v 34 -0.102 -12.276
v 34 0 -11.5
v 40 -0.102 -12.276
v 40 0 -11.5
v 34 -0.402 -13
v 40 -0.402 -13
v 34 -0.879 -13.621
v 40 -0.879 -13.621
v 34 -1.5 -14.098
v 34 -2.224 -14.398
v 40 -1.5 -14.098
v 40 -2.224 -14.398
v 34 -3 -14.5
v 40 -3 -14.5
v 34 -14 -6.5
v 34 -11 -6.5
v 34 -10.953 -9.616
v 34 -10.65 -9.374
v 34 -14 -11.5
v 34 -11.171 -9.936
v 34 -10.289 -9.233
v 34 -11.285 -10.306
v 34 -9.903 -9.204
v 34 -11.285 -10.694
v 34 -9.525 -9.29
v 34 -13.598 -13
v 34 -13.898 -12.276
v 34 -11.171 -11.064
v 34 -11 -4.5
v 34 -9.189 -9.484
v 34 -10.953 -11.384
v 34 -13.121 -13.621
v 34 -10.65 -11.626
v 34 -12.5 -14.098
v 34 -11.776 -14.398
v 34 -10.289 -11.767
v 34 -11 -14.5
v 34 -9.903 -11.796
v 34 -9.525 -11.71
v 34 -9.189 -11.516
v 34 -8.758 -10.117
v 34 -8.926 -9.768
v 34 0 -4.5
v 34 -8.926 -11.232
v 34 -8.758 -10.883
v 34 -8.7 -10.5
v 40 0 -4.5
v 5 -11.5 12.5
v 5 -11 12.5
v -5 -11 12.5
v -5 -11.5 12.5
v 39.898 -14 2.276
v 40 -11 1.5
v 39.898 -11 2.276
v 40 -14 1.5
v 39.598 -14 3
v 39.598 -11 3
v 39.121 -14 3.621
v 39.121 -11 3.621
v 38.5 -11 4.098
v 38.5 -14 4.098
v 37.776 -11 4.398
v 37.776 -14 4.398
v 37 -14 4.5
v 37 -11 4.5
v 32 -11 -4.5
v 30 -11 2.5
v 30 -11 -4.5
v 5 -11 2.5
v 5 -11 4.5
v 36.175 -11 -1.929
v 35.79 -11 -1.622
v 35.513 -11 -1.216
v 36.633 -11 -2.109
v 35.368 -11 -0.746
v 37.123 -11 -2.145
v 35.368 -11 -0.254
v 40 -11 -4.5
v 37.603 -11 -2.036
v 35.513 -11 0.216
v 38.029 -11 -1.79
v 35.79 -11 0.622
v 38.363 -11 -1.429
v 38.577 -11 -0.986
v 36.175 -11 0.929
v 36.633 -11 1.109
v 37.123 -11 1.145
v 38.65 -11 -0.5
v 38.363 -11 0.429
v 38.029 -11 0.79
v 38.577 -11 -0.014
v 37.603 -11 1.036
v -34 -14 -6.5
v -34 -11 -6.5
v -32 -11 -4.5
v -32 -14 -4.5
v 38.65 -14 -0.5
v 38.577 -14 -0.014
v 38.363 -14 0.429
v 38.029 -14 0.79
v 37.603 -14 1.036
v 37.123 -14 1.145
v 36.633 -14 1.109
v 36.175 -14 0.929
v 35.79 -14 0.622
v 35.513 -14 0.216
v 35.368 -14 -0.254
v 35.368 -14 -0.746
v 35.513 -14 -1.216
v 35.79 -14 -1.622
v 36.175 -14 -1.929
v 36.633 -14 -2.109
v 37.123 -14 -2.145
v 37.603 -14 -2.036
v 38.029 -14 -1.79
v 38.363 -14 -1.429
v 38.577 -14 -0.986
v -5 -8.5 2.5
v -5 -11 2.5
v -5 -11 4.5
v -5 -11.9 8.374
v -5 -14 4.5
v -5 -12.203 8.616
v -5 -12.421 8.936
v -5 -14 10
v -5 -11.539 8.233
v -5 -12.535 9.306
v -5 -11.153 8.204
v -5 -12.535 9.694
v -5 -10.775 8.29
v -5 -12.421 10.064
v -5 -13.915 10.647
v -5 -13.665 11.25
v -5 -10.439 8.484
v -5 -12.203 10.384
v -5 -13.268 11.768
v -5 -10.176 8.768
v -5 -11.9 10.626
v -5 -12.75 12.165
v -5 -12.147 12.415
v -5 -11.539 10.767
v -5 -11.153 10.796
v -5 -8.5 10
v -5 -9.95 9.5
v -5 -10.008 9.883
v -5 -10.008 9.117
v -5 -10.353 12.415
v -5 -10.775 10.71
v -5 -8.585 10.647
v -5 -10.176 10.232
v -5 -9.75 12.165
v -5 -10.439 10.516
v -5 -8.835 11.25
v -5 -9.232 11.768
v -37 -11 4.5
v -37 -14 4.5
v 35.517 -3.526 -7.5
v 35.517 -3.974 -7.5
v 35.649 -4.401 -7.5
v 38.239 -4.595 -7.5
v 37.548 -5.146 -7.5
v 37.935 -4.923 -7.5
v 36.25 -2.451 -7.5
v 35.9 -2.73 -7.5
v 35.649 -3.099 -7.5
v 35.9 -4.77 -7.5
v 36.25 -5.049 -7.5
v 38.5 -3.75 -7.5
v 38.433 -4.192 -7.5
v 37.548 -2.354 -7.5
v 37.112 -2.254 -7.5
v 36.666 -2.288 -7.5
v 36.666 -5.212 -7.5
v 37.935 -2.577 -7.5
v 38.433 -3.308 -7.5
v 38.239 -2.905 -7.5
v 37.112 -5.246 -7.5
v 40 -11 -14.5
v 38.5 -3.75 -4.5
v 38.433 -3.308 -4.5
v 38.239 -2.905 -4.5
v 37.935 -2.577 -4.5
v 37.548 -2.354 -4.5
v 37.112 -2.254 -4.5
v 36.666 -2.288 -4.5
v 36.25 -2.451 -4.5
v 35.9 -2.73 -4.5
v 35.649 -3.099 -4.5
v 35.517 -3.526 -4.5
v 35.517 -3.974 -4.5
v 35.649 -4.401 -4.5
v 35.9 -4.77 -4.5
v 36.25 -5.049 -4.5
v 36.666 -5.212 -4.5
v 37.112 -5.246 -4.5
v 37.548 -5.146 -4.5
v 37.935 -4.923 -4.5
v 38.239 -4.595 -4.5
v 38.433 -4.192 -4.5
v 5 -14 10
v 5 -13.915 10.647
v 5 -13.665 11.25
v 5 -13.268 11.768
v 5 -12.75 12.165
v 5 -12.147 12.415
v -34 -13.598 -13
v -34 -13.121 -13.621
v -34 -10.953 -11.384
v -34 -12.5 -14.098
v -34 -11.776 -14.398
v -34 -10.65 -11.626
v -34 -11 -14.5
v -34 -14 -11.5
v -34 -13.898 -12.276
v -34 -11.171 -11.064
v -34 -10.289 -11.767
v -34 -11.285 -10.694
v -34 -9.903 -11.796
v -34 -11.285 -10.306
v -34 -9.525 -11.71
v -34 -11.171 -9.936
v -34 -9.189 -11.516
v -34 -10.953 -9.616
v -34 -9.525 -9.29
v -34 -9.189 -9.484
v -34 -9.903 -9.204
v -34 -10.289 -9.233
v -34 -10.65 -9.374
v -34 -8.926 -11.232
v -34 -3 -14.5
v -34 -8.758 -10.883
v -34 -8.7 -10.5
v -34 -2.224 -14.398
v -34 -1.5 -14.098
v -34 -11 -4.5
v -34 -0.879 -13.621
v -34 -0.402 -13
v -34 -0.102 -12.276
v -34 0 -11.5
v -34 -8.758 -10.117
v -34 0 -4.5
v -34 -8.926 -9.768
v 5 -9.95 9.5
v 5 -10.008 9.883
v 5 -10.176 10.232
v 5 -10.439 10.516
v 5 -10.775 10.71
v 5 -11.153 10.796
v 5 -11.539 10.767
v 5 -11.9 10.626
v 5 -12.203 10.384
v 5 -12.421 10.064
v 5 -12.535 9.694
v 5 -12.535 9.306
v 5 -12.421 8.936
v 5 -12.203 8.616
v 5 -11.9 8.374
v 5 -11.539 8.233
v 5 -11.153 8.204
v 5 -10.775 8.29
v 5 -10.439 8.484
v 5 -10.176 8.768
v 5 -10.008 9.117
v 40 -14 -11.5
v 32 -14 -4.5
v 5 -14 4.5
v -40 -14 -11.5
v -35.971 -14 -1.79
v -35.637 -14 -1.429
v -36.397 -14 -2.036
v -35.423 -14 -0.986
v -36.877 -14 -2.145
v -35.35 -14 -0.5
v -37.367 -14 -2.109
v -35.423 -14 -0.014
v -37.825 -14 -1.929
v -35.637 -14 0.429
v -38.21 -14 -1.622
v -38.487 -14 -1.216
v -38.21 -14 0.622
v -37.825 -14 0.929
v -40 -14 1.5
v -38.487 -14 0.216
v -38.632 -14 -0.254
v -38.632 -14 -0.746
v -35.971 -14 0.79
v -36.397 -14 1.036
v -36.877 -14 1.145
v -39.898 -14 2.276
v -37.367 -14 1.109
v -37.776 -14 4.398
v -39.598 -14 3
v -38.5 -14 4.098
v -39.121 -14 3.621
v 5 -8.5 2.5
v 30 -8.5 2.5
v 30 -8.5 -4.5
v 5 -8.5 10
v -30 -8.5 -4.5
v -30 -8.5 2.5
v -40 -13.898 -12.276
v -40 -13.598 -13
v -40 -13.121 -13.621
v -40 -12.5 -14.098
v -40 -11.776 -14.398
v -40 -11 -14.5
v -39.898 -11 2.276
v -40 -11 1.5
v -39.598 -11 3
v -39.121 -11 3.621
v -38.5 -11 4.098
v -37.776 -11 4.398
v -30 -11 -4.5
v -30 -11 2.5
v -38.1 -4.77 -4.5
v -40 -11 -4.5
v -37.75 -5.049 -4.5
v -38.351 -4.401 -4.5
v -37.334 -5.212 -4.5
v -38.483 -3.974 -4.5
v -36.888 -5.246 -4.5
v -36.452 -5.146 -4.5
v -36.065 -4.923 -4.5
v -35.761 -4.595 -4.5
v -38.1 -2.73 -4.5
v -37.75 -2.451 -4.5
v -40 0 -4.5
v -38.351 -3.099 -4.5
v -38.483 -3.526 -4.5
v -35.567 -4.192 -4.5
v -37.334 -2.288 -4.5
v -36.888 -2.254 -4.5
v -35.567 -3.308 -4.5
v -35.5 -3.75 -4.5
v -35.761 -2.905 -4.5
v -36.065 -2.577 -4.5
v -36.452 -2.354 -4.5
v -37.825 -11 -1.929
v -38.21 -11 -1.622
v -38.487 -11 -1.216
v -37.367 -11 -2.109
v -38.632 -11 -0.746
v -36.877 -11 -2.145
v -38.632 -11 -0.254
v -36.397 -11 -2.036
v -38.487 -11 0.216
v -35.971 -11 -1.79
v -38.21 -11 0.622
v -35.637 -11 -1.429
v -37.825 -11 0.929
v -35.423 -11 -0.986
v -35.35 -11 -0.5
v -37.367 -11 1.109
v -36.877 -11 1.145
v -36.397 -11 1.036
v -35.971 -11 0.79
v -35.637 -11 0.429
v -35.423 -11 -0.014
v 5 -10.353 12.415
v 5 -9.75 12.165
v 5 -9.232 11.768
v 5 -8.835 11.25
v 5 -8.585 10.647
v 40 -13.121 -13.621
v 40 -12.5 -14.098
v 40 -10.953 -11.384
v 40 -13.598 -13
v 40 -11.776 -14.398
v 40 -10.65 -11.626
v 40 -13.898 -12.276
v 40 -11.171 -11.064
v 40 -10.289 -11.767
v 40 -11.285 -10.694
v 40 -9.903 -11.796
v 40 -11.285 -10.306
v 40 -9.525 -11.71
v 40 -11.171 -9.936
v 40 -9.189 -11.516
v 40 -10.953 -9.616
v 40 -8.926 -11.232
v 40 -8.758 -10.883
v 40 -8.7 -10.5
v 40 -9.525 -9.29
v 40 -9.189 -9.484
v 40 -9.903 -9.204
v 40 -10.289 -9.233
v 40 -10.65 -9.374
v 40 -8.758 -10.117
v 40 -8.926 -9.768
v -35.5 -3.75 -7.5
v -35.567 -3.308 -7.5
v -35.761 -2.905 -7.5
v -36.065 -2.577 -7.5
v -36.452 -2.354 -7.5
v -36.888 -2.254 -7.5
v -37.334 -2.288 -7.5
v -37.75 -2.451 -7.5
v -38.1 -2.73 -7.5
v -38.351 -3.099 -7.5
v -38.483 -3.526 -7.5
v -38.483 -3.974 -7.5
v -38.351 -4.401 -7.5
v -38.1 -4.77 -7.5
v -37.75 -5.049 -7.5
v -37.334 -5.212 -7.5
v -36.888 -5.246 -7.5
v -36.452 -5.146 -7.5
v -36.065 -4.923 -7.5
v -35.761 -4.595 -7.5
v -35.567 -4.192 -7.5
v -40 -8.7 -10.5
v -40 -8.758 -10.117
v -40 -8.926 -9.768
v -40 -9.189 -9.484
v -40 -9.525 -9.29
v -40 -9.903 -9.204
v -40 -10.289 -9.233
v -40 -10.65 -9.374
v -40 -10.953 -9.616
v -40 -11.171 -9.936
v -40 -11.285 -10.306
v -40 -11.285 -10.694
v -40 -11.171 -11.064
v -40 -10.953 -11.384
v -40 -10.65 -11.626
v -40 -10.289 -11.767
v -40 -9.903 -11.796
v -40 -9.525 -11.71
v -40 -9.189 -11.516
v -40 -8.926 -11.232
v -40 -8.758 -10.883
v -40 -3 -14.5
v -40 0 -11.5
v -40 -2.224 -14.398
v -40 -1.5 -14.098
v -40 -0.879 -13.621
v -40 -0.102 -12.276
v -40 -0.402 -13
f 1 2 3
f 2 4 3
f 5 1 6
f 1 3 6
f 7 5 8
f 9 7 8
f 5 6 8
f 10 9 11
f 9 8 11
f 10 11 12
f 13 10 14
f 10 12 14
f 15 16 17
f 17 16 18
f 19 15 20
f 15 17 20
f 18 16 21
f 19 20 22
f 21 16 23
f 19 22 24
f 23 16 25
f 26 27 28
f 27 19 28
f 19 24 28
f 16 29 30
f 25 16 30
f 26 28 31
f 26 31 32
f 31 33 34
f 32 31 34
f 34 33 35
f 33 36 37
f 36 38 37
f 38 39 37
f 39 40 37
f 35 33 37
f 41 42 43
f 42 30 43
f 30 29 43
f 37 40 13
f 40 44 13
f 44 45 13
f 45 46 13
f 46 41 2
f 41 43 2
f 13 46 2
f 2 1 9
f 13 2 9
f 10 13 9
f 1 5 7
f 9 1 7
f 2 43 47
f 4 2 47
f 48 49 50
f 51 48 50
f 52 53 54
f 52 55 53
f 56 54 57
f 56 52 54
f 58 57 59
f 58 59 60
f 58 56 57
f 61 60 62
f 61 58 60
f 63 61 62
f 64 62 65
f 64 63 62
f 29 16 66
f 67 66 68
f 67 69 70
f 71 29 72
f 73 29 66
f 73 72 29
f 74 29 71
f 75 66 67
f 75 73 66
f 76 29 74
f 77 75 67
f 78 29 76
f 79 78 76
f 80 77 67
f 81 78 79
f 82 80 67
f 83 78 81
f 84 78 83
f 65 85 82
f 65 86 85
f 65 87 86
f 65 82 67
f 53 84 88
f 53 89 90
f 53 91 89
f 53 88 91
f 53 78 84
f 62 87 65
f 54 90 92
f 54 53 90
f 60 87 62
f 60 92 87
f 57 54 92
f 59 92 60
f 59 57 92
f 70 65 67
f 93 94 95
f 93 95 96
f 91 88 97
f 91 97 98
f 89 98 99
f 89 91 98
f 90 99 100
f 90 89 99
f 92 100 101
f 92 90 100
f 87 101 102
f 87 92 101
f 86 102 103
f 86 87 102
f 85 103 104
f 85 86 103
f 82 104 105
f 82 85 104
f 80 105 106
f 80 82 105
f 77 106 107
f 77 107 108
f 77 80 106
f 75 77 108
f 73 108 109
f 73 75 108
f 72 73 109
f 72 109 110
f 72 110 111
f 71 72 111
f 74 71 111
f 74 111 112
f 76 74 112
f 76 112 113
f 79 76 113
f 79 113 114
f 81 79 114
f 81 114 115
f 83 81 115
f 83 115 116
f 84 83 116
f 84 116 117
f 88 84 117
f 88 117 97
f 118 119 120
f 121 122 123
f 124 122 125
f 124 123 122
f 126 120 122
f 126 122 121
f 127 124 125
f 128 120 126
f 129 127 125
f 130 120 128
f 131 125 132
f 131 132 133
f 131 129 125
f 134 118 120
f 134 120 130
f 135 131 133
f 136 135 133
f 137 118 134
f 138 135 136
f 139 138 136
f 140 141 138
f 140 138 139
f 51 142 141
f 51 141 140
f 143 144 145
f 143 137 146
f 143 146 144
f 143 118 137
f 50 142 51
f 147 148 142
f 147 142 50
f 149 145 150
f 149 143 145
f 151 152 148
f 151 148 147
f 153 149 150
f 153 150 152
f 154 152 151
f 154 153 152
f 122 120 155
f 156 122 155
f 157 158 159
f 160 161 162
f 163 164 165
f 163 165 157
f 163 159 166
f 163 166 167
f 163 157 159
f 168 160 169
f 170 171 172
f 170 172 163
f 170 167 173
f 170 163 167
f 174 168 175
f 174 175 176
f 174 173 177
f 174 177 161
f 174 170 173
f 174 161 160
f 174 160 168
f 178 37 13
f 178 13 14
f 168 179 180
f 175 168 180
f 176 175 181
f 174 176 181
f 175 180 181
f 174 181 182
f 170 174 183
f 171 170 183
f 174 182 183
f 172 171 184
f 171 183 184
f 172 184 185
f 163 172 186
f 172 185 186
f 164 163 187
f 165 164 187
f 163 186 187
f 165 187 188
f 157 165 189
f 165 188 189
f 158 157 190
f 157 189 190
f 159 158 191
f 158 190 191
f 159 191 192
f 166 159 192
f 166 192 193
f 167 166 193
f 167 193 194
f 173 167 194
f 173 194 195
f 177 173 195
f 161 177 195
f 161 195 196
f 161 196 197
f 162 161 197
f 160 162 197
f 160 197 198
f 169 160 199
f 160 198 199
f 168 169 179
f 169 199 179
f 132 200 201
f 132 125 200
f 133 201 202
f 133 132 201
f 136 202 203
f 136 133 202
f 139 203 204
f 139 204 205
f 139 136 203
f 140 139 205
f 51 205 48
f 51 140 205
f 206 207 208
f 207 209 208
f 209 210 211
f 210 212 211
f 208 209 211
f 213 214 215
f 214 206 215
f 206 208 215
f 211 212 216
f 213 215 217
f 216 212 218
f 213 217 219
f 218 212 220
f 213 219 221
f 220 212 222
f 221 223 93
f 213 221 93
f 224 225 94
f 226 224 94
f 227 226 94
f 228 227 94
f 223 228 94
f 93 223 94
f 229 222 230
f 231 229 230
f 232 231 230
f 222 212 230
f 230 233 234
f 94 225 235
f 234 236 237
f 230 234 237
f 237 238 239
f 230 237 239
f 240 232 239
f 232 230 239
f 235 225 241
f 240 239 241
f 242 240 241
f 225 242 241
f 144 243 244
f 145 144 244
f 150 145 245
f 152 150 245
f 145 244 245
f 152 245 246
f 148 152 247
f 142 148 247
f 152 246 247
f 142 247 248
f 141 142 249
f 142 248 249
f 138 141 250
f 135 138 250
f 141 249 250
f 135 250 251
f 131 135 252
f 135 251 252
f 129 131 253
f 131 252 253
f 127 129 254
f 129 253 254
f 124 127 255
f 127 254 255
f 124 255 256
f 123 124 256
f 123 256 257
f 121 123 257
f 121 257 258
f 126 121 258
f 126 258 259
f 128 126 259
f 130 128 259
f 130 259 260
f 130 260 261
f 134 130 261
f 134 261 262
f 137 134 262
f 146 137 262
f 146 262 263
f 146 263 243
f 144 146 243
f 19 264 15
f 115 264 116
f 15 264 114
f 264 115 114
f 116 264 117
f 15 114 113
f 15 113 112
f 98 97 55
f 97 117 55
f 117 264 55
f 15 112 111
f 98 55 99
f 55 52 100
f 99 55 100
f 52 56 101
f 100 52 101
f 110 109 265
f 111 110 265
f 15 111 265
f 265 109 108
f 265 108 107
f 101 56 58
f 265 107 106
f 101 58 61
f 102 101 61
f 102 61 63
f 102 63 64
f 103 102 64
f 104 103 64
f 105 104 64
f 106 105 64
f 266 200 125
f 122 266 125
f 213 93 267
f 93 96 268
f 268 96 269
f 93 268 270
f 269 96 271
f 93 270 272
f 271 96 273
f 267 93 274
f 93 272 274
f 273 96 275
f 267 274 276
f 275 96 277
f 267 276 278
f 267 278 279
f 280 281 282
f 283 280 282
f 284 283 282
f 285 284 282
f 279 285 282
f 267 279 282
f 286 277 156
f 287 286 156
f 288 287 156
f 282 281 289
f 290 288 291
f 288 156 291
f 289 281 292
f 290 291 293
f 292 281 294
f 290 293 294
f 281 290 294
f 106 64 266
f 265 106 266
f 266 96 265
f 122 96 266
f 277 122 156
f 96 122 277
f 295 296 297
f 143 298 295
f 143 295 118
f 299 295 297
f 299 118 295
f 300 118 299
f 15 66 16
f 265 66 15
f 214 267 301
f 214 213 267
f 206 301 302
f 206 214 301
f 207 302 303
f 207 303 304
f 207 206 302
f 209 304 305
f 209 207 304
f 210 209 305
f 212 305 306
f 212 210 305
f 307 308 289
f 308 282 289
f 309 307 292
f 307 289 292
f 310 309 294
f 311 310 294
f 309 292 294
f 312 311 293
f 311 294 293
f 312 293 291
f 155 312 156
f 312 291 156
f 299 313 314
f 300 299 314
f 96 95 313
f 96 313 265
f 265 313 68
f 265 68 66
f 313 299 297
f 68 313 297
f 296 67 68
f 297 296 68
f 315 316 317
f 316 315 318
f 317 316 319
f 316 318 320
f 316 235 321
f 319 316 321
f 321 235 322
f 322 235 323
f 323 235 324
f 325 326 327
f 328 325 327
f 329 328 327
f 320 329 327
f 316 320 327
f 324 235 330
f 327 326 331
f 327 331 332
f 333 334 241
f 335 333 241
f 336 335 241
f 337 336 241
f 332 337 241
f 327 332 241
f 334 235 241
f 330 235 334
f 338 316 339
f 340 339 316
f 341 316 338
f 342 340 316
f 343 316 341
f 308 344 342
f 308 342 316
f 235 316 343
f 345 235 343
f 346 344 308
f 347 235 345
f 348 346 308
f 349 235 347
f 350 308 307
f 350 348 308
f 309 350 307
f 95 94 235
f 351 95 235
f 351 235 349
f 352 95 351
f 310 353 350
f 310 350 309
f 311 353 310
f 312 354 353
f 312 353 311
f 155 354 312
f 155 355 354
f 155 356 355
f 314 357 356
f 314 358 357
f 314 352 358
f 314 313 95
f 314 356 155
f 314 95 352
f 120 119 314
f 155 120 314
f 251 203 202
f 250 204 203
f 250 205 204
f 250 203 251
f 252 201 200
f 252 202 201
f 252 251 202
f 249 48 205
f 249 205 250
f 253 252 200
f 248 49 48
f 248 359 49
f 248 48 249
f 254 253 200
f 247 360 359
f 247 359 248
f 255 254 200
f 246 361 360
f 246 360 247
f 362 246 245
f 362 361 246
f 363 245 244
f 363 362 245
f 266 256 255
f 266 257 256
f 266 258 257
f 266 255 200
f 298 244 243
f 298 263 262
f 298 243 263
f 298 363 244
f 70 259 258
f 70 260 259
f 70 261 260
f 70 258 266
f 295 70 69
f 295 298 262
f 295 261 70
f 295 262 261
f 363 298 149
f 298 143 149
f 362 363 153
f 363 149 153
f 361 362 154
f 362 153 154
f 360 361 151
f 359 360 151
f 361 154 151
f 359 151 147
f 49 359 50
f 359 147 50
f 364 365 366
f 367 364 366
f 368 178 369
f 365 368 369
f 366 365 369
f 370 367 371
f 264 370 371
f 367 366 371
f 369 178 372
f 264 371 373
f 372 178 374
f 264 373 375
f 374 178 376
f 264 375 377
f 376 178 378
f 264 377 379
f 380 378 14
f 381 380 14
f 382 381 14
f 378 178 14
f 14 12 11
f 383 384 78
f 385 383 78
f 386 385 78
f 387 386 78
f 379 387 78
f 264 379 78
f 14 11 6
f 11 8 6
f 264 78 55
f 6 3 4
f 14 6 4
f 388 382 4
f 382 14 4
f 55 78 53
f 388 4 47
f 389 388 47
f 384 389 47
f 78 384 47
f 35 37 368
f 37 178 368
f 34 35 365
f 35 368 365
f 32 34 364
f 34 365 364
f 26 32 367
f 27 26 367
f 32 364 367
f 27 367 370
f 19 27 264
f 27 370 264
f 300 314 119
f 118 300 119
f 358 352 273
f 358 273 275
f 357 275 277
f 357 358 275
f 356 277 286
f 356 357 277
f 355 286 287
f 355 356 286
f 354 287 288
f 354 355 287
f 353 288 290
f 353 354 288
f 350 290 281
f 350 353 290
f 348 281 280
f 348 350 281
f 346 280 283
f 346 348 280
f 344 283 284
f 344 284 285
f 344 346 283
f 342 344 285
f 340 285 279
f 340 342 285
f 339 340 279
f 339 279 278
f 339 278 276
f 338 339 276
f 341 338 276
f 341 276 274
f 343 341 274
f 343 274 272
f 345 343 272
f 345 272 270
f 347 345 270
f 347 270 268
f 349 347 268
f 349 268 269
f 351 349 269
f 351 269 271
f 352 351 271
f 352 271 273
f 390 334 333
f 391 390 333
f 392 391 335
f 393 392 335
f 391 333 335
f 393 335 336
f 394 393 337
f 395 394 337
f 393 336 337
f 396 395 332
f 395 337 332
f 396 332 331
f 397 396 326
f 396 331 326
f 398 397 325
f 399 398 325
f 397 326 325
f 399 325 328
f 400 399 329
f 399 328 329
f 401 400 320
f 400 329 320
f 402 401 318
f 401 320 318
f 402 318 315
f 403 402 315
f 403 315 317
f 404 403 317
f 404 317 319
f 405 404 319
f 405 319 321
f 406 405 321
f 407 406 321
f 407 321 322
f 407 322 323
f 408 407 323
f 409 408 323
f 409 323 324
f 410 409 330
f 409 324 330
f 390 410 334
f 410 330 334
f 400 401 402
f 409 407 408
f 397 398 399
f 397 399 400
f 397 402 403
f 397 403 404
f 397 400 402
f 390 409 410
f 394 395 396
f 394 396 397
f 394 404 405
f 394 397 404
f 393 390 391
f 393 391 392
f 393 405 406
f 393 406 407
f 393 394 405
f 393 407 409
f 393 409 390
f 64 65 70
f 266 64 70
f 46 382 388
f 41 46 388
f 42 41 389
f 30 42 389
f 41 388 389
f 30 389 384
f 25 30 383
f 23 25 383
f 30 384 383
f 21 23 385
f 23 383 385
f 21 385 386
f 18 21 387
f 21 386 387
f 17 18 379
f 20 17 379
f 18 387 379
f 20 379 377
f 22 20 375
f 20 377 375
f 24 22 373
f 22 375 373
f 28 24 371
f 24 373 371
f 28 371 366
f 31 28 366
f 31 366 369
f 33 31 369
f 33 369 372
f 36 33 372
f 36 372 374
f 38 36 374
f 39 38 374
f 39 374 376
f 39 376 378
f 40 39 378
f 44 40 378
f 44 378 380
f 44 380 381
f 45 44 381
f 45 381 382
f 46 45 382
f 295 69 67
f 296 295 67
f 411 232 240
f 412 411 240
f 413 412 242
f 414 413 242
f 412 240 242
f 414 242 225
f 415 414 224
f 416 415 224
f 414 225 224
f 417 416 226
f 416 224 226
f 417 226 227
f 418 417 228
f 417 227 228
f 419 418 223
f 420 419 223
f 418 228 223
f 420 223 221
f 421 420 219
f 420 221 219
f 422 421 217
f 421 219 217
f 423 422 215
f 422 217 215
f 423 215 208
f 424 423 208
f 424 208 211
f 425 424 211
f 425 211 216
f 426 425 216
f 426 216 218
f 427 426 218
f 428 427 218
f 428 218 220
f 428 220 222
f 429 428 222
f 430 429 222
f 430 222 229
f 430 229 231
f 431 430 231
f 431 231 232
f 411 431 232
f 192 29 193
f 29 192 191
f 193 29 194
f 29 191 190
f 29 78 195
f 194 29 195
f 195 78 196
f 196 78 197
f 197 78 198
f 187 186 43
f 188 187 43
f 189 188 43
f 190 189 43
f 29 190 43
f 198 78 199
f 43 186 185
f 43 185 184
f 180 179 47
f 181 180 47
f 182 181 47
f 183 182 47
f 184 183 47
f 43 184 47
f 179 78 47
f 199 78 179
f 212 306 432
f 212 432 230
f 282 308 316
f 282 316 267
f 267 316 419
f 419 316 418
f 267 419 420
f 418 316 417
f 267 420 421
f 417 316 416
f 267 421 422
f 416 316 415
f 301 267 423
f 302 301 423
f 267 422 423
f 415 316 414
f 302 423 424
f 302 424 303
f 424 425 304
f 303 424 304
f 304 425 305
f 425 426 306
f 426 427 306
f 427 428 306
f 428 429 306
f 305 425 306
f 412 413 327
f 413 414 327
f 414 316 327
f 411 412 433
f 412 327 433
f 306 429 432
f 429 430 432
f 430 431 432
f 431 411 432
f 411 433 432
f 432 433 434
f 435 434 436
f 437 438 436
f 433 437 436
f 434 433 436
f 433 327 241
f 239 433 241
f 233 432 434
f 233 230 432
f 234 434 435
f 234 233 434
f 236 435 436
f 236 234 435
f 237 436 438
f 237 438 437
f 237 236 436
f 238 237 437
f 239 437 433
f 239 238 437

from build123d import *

# Parameters (mm, degrees)
F0_R      = 1.65
F1_DEPTH  = 14
F2_W      = 11
F2_H      = 9
F3_DEPTH  = 80.001
F4_R      = 1.3
F5_DEPTH  = 80.001
F6_R      = 3
F7_SIZE   = 2
F8_R      = 1.5
F9_DEPTH  = 3
F11_DEPTH = 2.5
F12_W     = 10
F12_H     = 8
F12_H_2   = 2
F13_DEPTH = 5.5
F14_R     = 2.5
F15_R     = 1.3
F16_DEPTH = 45.001


with BuildPart() as f1:
    # F0 (on Front) → F1 (new body)
    with BuildSketch(Plane.XZ):
        Polygon((-34, -4.5), (34, -4.5), (34, -14.5), (40, -14.5), (40, -4.5), (40, 4.5), (-40, 4.5), (-40, -4.5), (-40, -14.5), (-34, -14.5), align=None)
        with Locations((-37, -0.5)):
            Circle(F0_R, mode=Mode.SUBTRACT)
        with Locations((37, -0.5)):
            Circle(F0_R, mode=Mode.SUBTRACT)
    extrude(amount=F1_DEPTH)

    # F2 (on face) → F3 (cut, through all)
    with BuildSketch(Plane.YZ.offset(40)):
        with Locations((-5.5, 0)):
            Rectangle(F2_W, F2_H)
    extrude(amount=-F3_DEPTH, mode=Mode.SUBTRACT)

    # F4 (on face) → F5 (cut, through all)
    with BuildSketch(Plane.YZ.offset(40)):
        with Locations((-10, -10.5)):
            Circle(F4_R)
    extrude(amount=-F5_DEPTH, mode=Mode.SUBTRACT)

    # F6
    f6_edges = [f1.edges().sort_by_distance(p)[0] for p in [
        (37, -14, -14.5),
        (-37, -14, -14.5),
        (-37, 0, -14.5),
        (37, 0, -14.5),
        (40, -12.5, 4.5),
        (-40, -12.5, 4.5),
    ]]
    fillet(f6_edges, radius=F6_R)

    # F7
    f7_edges = [f1.edges().sort_by_distance(p)[0] for p in [
        (34, -12.5, -4.5),
        (-34, -12.5, -4.5),
    ]]
    chamfer(f7_edges, length=F7_SIZE)

    # F8 (on face) → F9 (cut)
    with BuildSketch(Plane.XY.offset(-4.5)):
        with Locations((-37, -3.75)):
            Circle(F8_R)
        with Locations((37, -3.75)):
            Circle(F8_R)
    extrude(amount=-F9_DEPTH, mode=Mode.SUBTRACT)

    # F10 (on face) → F11 (join)
    with BuildSketch(Plane(origin=(0, -11, 0), x_dir=(-1, 0, 0), z_dir=(0, 1, 0))):
        Polygon((-5, 2.5), (-30, 2.5), (-30, -4.5), (30, -4.5), (30, 2.5), (5, 2.5), (5, 4.5), (-5, 4.5), align=None)
    extrude(amount=F11_DEPTH)

    # F12 (on face) → F13 (join)
    with BuildSketch(Plane(origin=(0, -8.5, 0), x_dir=(-1, 0, 0), z_dir=(0, 1, 0))):
        with Locations((0, 8.5)):
            Rectangle(F12_W, F12_H)
        with Locations((0, 3.5)):
            Rectangle(F12_W, F12_H_2)
    extrude(amount=-F13_DEPTH)

    # F14
    f14_edges = [f1.edges().sort_by_distance(p)[0] for p in [
        (0, -14, 12.5),
        (0, -8.5, 12.5),
    ]]
    fillet(f14_edges, radius=F14_R)

    # F15 (on face) → F16 (cut, through all)
    with BuildSketch(Plane.YZ.offset(5)):
        with Locations((-11.25, 9.5)):
            Circle(F15_R)
    extrude(amount=-F16_DEPTH, mode=Mode.SUBTRACT)


solid = f1.part
